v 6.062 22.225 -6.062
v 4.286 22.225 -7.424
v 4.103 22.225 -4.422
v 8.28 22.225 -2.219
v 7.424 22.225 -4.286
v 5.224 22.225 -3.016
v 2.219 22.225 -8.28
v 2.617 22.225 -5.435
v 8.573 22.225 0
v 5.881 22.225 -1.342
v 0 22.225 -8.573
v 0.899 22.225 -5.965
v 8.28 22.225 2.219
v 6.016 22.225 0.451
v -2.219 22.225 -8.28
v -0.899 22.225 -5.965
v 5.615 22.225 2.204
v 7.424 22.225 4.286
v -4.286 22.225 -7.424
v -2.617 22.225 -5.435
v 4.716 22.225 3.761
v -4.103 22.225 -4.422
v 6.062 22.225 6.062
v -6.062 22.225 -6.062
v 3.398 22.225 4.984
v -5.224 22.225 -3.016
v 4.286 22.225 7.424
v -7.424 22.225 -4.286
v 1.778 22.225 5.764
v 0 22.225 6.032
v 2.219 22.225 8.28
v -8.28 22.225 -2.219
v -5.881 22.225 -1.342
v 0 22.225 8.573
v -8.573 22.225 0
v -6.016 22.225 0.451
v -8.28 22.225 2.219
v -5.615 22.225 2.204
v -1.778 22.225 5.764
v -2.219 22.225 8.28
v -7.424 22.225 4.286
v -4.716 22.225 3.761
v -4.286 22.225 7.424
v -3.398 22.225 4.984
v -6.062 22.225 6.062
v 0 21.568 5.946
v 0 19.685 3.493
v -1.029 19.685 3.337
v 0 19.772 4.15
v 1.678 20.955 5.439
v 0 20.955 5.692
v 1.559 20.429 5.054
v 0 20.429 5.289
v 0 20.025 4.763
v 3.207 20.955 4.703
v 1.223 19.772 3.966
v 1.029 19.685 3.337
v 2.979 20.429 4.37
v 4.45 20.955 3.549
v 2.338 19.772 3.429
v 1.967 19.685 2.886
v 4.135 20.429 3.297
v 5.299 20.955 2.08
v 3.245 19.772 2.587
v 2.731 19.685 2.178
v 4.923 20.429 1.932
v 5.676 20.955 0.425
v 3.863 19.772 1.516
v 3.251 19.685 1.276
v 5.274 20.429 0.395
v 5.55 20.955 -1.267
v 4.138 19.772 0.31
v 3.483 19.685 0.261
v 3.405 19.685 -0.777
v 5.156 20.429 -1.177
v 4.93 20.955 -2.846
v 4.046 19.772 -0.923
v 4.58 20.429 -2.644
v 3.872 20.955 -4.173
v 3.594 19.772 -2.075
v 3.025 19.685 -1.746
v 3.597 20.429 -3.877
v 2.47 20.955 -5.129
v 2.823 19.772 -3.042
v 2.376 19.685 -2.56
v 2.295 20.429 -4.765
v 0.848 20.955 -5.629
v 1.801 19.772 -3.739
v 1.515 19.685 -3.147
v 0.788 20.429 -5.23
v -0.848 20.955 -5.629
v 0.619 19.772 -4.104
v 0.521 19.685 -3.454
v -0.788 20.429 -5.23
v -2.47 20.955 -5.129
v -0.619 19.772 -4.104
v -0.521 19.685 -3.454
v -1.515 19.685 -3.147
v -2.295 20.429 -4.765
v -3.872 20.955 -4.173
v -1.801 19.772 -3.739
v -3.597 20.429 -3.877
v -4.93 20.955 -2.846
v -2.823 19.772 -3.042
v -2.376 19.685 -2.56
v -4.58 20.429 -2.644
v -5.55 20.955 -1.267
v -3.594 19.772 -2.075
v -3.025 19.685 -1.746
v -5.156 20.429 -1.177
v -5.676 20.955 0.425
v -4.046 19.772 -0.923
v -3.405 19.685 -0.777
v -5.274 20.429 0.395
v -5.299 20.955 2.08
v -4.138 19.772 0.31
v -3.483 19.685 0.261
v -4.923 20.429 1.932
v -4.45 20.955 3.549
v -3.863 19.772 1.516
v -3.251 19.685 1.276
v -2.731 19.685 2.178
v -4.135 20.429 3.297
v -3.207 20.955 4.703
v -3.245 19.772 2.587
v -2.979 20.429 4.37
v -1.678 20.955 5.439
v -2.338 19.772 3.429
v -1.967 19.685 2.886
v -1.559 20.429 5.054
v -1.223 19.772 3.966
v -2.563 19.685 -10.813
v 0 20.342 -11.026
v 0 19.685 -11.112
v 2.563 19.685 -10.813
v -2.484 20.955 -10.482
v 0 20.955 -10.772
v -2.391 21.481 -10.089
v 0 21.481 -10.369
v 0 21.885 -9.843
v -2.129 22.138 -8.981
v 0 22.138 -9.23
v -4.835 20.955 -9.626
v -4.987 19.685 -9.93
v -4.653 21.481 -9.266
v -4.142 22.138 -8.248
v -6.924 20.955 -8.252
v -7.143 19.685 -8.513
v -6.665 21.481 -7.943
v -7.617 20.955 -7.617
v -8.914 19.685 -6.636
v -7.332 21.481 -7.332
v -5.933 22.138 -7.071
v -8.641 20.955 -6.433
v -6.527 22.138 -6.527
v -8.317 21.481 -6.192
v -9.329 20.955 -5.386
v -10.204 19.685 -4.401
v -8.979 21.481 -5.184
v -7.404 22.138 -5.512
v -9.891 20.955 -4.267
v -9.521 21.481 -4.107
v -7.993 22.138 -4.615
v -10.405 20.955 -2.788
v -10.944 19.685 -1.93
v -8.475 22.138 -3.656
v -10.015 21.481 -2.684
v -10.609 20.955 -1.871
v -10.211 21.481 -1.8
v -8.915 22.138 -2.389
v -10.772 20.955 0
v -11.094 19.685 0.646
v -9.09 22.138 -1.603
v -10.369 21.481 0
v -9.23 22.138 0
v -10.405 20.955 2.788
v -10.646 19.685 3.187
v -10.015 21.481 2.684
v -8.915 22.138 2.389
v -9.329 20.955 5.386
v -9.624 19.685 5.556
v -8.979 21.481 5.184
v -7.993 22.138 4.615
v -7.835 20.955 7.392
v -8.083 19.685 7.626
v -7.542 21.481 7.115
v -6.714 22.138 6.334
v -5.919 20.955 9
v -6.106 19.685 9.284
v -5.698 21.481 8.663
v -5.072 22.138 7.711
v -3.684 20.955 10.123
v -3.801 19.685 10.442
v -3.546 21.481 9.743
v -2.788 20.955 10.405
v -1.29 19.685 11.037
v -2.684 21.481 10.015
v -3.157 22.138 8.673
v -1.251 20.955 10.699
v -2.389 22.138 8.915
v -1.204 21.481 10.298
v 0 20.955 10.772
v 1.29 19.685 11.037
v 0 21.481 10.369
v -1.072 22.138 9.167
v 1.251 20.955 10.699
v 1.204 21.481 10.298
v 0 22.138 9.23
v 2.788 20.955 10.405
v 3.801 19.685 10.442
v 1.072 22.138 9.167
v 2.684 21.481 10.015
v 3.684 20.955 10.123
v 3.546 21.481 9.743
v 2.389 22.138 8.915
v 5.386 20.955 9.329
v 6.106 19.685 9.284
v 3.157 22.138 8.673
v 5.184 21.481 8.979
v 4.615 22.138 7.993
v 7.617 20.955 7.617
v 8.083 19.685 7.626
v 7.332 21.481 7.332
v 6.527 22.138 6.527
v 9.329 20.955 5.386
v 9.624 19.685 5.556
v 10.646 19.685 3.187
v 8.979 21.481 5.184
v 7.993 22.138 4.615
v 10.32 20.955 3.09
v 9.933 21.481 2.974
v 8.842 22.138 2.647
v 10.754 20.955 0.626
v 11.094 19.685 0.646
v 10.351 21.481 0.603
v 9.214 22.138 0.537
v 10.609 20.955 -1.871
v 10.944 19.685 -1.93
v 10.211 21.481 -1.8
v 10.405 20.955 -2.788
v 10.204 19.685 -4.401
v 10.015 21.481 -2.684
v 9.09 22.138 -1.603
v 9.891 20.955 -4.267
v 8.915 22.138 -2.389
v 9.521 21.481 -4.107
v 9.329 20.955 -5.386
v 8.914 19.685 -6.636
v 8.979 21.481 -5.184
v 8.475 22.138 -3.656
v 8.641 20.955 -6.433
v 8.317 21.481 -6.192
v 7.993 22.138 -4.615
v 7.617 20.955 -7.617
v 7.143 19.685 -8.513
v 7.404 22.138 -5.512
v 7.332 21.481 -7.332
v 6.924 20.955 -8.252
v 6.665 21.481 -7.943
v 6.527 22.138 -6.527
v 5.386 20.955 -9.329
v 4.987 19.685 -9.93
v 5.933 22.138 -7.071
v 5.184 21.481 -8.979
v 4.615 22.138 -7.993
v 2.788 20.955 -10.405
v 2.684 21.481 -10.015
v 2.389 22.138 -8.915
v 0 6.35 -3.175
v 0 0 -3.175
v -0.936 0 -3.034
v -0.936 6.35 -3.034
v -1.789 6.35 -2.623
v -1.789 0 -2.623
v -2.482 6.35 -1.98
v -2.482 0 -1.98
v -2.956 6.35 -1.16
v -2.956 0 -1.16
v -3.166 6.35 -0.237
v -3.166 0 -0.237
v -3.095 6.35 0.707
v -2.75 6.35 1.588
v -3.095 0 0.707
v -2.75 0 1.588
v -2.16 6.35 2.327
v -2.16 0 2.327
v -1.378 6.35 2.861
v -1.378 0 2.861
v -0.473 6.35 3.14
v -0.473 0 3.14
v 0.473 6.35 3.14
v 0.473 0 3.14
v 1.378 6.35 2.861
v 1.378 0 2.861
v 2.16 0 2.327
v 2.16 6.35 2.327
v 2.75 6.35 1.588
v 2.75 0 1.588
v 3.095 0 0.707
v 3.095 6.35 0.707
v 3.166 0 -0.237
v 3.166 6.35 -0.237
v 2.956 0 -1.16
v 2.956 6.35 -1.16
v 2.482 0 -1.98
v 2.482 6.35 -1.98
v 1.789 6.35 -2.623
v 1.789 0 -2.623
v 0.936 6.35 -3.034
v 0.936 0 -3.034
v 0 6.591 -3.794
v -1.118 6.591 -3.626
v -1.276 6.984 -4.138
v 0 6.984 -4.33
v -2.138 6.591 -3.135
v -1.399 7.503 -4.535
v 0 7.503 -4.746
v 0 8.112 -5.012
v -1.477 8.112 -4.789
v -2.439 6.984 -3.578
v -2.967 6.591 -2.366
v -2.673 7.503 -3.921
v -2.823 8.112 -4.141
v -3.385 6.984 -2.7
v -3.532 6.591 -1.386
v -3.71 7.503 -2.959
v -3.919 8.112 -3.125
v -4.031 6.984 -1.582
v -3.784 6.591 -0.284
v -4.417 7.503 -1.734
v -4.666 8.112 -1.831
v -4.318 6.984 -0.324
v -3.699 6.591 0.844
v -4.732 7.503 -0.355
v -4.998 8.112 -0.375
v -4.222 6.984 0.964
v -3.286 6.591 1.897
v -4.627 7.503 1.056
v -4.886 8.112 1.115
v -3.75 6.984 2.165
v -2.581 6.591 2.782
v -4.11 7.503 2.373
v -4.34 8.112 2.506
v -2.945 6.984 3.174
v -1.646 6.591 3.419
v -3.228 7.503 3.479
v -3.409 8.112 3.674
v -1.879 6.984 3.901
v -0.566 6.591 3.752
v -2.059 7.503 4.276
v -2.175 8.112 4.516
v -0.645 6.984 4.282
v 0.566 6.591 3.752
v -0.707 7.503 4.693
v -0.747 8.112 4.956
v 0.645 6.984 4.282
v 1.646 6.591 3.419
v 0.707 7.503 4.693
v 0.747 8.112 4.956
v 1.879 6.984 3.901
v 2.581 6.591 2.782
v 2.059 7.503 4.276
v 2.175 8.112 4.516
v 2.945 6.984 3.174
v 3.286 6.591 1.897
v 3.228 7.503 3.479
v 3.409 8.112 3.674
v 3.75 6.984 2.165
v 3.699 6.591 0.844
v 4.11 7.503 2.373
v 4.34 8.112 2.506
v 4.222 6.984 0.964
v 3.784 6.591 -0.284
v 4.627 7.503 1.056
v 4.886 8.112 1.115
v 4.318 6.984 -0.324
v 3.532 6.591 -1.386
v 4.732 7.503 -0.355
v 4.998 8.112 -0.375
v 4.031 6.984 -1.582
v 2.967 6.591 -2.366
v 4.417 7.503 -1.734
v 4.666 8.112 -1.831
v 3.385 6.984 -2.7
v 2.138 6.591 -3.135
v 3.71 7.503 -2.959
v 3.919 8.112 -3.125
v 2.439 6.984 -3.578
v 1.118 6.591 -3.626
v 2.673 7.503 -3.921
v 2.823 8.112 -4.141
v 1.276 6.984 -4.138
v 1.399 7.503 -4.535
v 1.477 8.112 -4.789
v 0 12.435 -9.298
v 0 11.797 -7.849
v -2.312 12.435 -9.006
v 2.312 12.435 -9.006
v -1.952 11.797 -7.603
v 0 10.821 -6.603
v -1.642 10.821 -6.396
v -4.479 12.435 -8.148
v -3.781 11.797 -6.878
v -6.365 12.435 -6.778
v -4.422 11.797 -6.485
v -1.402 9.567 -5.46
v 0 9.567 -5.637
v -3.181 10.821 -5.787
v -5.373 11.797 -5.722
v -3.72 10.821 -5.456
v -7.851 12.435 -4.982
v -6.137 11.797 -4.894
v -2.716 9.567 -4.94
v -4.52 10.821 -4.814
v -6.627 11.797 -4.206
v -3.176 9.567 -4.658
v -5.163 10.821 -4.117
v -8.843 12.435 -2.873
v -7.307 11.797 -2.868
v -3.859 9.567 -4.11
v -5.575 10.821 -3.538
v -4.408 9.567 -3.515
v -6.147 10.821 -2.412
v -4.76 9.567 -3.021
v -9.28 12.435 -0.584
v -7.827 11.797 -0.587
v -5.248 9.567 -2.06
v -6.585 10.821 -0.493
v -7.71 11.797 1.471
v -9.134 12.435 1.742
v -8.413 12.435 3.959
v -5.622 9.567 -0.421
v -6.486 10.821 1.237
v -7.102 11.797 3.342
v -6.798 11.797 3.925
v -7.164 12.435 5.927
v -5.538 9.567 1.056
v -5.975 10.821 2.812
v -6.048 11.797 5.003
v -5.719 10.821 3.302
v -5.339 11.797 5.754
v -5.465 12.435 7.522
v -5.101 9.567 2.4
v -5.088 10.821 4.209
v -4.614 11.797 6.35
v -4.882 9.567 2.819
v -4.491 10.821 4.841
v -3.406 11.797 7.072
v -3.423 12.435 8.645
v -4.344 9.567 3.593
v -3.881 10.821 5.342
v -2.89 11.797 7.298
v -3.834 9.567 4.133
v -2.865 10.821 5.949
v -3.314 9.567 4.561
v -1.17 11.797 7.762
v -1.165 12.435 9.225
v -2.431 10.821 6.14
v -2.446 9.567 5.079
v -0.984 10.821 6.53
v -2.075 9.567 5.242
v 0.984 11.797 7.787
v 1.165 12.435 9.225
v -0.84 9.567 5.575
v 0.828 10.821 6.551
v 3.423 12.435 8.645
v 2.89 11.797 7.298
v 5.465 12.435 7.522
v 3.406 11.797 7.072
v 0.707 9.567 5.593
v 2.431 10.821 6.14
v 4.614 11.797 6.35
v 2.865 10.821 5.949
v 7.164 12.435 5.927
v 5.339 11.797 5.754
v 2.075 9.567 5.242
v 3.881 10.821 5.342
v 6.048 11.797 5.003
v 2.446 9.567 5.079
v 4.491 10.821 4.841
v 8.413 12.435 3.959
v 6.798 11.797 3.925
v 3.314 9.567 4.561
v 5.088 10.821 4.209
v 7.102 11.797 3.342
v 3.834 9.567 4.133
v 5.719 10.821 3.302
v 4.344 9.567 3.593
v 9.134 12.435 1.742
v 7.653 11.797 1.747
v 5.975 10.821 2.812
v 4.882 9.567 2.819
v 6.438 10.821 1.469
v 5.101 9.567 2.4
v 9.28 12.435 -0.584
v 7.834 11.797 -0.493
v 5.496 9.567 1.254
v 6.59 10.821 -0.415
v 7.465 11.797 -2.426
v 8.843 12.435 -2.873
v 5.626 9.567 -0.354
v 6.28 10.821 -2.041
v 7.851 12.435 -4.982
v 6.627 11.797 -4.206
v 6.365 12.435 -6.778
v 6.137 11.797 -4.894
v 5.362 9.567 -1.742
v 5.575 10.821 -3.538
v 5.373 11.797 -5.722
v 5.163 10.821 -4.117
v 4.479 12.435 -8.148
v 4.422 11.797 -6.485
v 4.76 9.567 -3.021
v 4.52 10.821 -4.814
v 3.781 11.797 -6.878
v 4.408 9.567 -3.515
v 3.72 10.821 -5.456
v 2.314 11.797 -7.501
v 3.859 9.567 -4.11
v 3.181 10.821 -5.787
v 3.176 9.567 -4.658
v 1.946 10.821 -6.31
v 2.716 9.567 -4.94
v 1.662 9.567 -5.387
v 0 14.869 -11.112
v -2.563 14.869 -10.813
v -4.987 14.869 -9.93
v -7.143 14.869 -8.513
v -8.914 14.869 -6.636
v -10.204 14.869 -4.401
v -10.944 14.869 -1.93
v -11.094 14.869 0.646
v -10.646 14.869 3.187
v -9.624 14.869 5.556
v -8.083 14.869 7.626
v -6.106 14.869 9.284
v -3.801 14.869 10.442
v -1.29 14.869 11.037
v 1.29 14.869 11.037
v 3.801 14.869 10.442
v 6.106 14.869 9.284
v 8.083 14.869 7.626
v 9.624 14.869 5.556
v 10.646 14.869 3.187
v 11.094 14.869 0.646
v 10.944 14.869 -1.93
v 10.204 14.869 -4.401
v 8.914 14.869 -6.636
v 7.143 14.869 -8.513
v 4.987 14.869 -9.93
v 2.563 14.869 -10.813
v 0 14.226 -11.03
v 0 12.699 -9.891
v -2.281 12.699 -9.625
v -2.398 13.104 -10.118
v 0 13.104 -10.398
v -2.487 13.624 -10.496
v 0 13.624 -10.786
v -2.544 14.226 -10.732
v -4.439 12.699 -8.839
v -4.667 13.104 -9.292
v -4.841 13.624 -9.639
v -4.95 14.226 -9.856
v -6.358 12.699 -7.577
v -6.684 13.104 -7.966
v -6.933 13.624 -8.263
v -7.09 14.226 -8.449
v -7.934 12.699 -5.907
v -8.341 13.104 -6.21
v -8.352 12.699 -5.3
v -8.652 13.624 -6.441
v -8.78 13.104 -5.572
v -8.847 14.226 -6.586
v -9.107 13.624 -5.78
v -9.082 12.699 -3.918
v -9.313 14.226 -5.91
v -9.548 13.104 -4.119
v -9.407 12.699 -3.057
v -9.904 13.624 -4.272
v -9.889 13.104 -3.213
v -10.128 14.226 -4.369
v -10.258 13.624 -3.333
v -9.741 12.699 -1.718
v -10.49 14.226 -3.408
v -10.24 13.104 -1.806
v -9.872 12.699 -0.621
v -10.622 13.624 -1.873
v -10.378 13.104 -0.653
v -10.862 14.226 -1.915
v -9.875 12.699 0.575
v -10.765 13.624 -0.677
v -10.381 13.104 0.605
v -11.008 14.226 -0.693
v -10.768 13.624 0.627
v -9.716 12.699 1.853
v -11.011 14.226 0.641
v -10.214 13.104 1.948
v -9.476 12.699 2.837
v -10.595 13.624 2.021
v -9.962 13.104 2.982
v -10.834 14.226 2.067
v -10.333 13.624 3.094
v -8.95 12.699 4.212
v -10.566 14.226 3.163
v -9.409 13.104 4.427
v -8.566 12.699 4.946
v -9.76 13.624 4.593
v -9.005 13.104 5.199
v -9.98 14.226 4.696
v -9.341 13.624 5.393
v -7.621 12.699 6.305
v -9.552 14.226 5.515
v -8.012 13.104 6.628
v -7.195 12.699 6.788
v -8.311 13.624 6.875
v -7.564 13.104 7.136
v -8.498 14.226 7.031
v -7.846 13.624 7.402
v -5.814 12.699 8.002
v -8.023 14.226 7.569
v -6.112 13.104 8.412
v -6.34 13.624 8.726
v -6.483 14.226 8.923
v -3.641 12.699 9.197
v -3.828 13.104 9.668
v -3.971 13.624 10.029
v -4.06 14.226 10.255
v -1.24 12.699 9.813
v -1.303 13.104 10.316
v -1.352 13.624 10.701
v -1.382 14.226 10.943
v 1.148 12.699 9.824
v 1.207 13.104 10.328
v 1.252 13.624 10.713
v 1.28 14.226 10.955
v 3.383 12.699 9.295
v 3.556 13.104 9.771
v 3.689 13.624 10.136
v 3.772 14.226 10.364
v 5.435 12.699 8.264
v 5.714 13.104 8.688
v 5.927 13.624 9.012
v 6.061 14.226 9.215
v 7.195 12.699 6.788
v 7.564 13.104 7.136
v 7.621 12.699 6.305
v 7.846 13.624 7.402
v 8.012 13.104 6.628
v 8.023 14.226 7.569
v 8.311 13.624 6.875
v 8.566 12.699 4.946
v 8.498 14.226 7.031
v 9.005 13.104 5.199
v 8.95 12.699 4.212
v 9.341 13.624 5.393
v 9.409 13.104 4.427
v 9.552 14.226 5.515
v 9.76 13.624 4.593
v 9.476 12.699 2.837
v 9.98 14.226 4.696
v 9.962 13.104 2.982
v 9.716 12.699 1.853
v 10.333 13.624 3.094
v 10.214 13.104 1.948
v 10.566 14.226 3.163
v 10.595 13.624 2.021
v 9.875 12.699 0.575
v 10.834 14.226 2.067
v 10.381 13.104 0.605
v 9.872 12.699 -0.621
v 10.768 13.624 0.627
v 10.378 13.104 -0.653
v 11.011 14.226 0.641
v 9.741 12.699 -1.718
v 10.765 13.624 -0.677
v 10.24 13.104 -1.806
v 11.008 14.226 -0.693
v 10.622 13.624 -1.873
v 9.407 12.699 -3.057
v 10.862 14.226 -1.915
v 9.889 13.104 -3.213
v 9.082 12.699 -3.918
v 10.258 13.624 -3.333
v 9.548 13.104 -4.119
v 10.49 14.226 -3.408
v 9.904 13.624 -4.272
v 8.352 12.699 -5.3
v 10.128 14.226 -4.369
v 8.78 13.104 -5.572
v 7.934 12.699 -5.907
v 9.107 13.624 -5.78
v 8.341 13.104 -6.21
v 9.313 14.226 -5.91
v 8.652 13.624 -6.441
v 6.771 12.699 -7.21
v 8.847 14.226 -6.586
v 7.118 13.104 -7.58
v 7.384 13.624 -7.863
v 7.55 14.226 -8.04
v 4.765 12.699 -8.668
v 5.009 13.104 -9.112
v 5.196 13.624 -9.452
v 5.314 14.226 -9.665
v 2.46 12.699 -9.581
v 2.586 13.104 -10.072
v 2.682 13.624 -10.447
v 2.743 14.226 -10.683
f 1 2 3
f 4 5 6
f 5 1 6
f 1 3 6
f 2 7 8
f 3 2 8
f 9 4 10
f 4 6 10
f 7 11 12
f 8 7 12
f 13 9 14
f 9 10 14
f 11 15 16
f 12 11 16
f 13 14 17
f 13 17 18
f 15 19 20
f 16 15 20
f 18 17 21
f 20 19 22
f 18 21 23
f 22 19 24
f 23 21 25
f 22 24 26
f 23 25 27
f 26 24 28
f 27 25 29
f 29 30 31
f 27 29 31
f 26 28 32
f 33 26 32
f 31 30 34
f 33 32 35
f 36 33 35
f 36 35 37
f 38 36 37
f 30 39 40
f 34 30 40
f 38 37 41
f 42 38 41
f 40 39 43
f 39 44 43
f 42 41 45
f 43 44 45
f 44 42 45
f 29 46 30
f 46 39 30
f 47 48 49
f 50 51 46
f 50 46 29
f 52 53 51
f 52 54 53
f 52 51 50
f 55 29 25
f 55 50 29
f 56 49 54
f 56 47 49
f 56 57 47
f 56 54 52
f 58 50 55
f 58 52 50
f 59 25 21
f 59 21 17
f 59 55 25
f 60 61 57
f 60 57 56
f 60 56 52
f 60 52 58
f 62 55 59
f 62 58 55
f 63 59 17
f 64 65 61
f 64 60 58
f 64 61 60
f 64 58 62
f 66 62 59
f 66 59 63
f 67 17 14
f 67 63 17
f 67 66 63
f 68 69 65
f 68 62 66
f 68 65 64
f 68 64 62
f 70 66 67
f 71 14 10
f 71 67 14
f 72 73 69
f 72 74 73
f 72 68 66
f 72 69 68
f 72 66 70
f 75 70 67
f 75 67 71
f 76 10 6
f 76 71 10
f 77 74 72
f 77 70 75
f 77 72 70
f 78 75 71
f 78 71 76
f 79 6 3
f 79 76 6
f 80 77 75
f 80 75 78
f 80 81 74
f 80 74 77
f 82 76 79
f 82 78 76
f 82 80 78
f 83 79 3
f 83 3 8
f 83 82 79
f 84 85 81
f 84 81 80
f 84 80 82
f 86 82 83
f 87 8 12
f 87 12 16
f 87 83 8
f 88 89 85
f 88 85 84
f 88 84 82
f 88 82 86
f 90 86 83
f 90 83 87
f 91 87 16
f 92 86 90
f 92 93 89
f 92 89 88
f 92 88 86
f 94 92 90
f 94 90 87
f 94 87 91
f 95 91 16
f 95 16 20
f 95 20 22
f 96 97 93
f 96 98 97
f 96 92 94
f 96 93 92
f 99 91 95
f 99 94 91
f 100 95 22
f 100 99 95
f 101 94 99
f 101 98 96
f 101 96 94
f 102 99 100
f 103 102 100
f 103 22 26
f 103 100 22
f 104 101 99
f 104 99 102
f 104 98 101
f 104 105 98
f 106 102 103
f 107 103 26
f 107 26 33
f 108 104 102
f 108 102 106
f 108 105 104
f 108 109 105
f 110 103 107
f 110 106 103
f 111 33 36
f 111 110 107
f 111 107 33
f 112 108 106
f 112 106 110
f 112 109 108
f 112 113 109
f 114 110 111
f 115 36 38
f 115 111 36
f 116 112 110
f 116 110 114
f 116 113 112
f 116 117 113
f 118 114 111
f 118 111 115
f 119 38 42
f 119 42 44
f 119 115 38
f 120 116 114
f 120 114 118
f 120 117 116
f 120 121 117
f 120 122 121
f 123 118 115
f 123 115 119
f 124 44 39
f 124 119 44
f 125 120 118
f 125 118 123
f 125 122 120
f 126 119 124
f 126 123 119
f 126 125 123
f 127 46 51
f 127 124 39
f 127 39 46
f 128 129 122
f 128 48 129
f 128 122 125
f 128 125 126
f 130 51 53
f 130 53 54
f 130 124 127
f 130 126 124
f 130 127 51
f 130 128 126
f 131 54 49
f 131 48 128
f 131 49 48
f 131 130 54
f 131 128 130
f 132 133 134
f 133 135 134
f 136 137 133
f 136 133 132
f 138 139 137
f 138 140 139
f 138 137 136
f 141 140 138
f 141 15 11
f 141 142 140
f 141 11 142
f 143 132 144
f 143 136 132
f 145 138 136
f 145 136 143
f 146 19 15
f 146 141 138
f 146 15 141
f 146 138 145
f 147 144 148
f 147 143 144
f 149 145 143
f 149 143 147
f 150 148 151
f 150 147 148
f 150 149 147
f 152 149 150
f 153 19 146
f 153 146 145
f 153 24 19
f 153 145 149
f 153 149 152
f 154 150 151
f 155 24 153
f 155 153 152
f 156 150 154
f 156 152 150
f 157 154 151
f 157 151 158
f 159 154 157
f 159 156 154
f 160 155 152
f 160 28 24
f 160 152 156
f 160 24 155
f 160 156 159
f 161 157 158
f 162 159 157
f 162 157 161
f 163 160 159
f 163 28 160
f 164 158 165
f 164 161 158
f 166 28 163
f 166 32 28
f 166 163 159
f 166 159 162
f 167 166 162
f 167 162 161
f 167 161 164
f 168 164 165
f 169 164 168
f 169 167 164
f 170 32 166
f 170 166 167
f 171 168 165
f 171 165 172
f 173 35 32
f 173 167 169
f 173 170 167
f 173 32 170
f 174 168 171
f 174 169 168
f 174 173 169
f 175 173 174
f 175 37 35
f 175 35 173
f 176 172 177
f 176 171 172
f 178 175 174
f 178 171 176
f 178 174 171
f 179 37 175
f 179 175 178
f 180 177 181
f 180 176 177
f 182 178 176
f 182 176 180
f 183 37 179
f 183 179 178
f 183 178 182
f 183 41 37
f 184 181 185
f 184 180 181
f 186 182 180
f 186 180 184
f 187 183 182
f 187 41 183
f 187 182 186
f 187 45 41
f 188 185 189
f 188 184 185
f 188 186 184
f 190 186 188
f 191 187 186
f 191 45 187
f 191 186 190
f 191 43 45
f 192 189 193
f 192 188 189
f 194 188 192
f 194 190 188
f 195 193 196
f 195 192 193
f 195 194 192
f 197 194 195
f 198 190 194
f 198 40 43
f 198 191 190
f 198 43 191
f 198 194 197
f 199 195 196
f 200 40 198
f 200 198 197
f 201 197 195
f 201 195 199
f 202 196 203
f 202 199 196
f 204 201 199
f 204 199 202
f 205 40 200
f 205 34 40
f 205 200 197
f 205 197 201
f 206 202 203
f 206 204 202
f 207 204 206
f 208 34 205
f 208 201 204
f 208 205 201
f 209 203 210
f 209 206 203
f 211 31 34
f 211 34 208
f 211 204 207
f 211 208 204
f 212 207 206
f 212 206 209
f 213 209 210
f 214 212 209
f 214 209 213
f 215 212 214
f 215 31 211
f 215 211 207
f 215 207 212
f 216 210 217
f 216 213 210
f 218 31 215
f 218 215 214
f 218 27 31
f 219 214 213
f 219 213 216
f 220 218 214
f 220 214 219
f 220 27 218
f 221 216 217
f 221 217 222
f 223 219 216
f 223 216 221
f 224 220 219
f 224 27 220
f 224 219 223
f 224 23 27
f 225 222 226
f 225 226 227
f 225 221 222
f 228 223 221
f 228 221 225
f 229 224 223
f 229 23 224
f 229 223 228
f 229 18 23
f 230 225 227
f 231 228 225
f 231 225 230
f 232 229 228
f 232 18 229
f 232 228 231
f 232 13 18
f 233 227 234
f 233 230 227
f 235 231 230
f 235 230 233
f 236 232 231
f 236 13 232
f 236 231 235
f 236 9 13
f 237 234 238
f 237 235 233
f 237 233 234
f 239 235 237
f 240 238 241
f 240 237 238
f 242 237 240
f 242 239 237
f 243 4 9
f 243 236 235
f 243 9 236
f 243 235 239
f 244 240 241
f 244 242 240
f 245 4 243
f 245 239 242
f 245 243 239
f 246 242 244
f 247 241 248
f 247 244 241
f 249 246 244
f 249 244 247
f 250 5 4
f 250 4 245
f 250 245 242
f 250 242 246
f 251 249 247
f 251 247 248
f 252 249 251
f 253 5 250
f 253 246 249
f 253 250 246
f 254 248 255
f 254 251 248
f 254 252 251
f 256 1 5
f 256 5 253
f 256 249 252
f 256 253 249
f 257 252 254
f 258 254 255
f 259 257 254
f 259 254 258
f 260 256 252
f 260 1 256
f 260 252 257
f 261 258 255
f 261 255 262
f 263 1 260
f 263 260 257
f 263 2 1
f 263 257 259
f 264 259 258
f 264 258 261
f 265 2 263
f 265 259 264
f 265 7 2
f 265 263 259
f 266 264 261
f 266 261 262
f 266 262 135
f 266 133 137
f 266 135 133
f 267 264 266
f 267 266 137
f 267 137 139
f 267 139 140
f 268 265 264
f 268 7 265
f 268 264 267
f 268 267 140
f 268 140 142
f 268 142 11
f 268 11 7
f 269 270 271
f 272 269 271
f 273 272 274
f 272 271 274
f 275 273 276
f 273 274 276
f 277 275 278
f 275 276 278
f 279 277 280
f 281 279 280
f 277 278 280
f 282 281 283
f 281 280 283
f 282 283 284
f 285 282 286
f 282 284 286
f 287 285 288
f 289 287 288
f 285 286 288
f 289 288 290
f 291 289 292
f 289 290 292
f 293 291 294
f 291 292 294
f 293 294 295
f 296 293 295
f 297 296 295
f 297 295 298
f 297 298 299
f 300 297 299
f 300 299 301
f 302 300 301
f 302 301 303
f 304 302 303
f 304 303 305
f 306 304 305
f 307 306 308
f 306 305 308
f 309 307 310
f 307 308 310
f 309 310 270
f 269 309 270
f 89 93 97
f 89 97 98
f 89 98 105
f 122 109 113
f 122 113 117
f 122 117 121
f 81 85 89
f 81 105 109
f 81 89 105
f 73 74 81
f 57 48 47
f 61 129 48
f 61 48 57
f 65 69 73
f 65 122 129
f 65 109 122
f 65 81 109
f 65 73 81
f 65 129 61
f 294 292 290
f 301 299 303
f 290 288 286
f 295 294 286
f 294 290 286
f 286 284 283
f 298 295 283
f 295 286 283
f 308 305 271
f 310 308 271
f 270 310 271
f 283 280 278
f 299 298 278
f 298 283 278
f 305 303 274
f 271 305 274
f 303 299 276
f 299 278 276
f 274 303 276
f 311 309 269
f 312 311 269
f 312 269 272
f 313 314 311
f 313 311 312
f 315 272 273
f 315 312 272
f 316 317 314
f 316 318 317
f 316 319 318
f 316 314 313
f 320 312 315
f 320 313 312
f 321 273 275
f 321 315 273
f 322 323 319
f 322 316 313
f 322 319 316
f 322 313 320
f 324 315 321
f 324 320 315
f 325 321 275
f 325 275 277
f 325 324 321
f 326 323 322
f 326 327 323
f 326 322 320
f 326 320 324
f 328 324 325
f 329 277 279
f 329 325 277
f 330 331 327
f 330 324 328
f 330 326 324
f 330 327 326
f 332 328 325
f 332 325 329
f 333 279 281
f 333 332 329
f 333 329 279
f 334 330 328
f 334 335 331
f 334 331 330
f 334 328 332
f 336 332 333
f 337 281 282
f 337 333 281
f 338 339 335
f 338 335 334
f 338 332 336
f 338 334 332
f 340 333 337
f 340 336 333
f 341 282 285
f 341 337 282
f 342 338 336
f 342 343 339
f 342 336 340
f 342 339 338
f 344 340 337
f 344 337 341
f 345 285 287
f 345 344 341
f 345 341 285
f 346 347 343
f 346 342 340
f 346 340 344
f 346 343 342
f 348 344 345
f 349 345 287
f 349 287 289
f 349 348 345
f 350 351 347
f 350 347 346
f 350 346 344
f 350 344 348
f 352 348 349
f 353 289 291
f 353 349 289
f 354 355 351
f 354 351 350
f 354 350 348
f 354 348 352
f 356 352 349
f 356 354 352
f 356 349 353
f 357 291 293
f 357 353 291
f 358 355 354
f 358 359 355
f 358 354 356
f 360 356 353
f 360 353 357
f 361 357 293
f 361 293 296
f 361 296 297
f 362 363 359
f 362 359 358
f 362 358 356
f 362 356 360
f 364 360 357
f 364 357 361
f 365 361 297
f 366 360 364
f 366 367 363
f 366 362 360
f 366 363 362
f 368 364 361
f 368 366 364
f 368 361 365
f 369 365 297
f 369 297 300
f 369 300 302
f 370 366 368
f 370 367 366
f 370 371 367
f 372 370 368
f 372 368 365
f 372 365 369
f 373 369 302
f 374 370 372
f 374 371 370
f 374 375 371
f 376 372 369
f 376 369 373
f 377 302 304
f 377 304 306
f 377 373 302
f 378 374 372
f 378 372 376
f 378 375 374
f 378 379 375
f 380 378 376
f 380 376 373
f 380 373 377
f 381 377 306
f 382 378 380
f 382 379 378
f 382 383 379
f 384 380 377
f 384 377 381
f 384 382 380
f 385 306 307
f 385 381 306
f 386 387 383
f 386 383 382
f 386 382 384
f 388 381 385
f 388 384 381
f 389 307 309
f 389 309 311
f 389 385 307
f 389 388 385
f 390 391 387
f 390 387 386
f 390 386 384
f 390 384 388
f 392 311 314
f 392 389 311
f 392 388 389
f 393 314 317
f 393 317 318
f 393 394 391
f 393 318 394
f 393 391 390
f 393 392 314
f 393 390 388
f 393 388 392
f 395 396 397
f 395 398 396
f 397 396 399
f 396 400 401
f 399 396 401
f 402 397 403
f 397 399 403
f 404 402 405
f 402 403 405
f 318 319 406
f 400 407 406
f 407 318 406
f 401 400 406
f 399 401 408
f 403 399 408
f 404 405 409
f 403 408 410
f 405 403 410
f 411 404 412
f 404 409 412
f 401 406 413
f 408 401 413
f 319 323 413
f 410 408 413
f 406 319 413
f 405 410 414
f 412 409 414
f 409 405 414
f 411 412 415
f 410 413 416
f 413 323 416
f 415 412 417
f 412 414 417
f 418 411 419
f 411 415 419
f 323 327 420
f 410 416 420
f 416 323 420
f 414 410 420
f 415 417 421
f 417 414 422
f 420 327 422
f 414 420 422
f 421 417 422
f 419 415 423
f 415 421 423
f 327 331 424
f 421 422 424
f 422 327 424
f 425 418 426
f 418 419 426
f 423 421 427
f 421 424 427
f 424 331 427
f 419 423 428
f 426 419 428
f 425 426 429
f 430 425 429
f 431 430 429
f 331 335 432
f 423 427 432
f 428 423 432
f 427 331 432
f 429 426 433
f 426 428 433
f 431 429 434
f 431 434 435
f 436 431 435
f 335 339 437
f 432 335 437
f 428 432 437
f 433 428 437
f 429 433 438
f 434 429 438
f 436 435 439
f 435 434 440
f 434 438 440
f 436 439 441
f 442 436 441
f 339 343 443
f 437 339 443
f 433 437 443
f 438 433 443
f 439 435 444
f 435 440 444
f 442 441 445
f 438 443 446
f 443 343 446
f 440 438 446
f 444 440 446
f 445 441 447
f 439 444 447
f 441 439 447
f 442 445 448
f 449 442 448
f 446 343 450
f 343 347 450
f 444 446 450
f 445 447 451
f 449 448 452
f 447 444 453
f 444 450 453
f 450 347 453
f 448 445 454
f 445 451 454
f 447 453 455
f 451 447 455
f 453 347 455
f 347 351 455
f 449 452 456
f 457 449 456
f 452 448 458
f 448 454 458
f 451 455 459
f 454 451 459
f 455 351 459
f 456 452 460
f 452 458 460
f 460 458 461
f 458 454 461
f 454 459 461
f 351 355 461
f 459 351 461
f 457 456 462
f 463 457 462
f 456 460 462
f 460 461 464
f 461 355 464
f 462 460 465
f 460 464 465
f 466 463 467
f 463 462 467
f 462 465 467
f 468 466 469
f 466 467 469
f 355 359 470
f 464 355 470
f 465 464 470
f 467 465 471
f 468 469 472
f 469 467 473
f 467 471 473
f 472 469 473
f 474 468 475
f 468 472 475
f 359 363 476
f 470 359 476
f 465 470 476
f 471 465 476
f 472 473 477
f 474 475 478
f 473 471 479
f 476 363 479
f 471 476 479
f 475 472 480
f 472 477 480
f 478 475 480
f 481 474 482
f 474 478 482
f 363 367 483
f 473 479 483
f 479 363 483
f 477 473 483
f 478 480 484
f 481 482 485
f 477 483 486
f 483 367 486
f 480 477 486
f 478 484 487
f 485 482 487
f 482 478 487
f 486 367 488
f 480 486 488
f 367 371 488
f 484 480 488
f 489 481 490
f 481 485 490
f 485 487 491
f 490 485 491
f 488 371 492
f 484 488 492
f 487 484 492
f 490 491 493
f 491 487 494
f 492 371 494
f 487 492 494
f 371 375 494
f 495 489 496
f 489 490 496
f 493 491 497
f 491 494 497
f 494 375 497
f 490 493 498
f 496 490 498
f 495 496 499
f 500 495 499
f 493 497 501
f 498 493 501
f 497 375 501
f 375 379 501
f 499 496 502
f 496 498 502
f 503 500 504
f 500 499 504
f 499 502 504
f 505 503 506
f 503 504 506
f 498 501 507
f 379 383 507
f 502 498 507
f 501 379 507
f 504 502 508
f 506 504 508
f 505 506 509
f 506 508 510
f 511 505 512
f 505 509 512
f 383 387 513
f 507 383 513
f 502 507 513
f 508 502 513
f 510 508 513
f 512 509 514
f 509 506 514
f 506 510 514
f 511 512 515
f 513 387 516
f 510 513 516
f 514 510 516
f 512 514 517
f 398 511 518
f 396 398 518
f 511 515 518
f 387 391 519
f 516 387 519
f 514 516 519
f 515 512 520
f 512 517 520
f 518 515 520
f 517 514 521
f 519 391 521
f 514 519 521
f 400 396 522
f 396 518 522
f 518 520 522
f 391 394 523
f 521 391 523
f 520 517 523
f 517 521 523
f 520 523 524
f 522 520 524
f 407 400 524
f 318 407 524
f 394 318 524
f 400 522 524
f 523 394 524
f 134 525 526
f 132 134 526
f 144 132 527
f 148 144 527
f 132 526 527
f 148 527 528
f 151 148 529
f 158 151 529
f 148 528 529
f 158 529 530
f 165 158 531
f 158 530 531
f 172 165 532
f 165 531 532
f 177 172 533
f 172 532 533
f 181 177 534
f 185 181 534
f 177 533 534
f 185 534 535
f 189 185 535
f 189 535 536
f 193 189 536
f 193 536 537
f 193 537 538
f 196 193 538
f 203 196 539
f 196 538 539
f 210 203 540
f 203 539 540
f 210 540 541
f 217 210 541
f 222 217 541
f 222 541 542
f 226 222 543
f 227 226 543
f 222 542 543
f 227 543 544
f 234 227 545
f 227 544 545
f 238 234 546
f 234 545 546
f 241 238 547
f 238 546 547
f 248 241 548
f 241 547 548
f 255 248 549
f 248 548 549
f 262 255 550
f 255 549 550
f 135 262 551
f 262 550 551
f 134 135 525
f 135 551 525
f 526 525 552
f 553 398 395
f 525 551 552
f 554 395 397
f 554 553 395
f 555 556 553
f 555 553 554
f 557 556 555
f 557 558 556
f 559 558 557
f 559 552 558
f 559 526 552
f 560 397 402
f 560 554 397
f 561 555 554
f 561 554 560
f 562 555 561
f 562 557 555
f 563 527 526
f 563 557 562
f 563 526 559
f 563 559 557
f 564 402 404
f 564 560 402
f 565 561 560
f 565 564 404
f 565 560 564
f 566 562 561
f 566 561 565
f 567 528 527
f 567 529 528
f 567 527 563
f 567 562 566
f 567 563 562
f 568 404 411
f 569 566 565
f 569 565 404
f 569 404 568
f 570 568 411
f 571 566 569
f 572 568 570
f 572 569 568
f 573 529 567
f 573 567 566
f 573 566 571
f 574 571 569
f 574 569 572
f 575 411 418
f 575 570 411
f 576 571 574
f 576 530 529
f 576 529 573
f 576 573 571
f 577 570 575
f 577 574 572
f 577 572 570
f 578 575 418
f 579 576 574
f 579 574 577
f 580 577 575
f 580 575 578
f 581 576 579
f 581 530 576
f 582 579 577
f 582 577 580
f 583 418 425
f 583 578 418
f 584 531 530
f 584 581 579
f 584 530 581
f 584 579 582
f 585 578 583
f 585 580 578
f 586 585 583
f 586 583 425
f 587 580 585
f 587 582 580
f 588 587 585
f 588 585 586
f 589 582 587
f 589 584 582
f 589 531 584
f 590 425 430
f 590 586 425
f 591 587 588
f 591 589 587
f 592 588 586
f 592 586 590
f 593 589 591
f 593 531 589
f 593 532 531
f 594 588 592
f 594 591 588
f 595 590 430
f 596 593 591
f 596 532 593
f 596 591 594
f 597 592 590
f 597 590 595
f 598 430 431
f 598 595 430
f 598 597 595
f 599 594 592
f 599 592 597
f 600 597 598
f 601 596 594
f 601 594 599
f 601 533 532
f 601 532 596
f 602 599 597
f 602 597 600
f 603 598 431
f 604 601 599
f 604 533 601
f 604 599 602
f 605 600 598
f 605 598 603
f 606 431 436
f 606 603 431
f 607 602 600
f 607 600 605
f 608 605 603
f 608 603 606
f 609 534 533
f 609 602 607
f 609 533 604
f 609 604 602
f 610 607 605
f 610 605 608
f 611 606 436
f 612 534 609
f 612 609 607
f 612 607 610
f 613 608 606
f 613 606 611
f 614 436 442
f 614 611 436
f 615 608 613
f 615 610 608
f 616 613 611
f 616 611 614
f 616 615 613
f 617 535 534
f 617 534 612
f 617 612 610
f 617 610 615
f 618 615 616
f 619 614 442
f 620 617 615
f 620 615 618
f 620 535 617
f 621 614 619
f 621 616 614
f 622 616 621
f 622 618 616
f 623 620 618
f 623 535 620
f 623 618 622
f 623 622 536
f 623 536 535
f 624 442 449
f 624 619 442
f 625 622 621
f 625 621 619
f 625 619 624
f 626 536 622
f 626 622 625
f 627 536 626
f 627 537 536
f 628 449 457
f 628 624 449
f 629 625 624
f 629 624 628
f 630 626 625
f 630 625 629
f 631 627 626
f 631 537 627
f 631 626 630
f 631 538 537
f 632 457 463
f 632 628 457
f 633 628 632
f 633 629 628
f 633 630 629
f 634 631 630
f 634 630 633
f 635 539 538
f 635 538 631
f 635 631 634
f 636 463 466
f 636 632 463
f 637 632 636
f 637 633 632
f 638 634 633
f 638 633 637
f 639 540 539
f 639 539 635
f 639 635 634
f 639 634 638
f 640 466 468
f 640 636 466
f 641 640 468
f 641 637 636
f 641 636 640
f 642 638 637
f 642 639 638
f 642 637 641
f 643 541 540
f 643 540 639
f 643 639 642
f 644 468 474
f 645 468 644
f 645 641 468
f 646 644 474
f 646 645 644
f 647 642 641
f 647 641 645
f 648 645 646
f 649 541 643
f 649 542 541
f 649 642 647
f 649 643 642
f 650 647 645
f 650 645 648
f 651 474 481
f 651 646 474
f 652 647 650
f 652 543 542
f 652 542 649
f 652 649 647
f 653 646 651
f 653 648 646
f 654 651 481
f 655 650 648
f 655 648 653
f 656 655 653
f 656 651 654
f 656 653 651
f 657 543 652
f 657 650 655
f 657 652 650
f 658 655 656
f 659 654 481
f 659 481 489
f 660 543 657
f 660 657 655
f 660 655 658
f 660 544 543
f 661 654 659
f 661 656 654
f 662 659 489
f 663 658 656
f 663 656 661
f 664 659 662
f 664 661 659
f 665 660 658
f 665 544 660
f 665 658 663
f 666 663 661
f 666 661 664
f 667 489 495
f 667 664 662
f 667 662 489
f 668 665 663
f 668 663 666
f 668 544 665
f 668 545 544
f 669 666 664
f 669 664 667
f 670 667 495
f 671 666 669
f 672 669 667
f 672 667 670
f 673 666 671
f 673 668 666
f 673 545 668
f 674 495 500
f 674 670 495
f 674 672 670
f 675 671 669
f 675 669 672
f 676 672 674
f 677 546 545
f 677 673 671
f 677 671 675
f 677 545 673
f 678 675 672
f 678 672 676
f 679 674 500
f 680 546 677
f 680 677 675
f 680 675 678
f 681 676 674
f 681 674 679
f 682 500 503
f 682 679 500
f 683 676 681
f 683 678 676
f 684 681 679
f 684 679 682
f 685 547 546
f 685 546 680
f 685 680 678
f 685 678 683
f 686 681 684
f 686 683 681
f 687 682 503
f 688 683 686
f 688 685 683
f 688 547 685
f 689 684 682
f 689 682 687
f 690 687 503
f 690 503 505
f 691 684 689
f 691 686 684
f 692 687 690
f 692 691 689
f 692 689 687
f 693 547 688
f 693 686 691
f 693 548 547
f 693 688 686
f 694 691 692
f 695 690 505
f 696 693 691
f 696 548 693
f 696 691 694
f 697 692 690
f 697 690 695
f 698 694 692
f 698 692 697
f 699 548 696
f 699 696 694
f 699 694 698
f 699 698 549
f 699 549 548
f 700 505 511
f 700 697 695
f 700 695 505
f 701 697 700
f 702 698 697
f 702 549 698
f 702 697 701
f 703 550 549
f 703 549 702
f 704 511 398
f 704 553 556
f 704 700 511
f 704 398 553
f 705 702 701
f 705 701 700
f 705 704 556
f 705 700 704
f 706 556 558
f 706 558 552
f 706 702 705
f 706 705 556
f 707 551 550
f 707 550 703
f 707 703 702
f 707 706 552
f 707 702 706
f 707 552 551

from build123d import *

# Parameters (mm, degrees)
FILLET1_R          = 2.54
SKETCH2_R          = 6.0325
CUT_EXTRUDE1_DEPTH = 2.54
FILLET2_R          = 2.54


# Some blends are built 0.0001 mm under size
with BuildPart() as part:
    # Sketch1 → Base-Revolve (revolve)
    with BuildSketch(Plane.XY, mode=Mode.PRIVATE) as base_revolve_sk:
        with BuildLine():
            ThreePointArc((11.1125, 12.7), (6.622371939, 10.840128061), (4.7625, 6.35))
            Line((4.7625, 6.35), (3.175, 6.35))
            Line((3.175, 6.35), (3.175, 0))
            Line((3.175, 0), (0, 0))
            Line((0, 0), (0, 22.225))
            Line((0, 22.225), (11.1125, 22.225))
            Line((11.1125, 22.225), (11.1125, 12.7))
        make_face()
    revolve(base_revolve_sk.sketch.rotate(Axis((0, 0, 0), (0, 1, 0)), 90), axis=Axis((0, 0, 0), (0, 1, 0)))

    # Fillet1
    # the kernel refuses this fillet: 2.54 mm, written as the material it takes off along each edge
    with BuildSketch(Plane(origin=(0, 6.35, 0), x_dir=(0, 0, -1), z_dir=(1, 0, 0))) as fillet1_piece_1:
        with BuildLine():
            CenterArc((2.57175, 2.467324348), FILLET1_R, 283.739035174, 60.14756783)
            Line((3.175, 0), (3.187065, -0.049346487))
            ThreePointArc((3.187065, -0.049346487), (3.96875, -0.0508), (4.7625, -0.0508))
            Line((4.7625, -0.0508), (4.8133, 0))
            ThreePointArc((4.8133, 0), (4.875473976, 0.882851637), (5.060768571, 1.748275538))
            Line((5.060768571, 1.748275538), (5.011964286, 1.762374534))
        make_face()
    revolve(axis=Axis((0, 6.35, 0), (0, 1, 0)), mode=Mode.SUBTRACT)
    with BuildSketch(Plane(origin=(0, 22.225, 0), x_dir=(0, 0, -1), z_dir=(1, 0, 0))) as fillet1_piece_2:
        with BuildLine():
            CenterArc((11.1125 - FILLET1_R, -FILLET1_R), FILLET1_R, 0, 90)
            Line((11.1125, -FILLET1_R), (11.1125 + FILLET1_R * 0.02, -FILLET1_R))
            Line((11.1125 + FILLET1_R * 0.02, -FILLET1_R), (11.1125 + FILLET1_R * 0.02, FILLET1_R * 0.02))
            Line((11.1125 + FILLET1_R * 0.02, FILLET1_R * 0.02), (11.1125 - FILLET1_R, FILLET1_R * 0.02))
            Line((11.1125 - FILLET1_R, FILLET1_R * 0.02), (11.1125 - FILLET1_R, 0))
        make_face()
    revolve(axis=Axis((0, 22.225, 0), (0, 1, 0)), mode=Mode.SUBTRACT)
    with BuildSketch(Plane(origin=(0, 12.7, 0), x_dir=(0, 0, -1), z_dir=(1, 0, 0))) as fillet1_piece_3:
        with BuildLine():
            CenterArc((8.5725, 2.169418994), FILLET1_R, 286.601549599, 73.398450401)
            Line((11.1125, 2.169418994), (11.1633, 2.169418994))
            Line((11.1633, 2.169418994), (11.1633, 0))
            Line((11.1633, 0), (11.1125, -0.0508))
            ThreePointArc((11.1125, -0.0508), (10.203087128, -0.116791447), (9.312728571, -0.313383113))
            Line((9.312728571, -0.313383113), (9.298214286, -0.264700718))
        make_face()
    revolve(axis=Axis((0, 12.7, 0), (0, 1, 0)), mode=Mode.SUBTRACT)

    # Sketch2 → Cut-Extrude1 (cut)
    with BuildSketch(Plane(origin=(0, 22.225, 0), x_dir=(1, 0, 0), z_dir=(0, 1, 0))):
        with Locations(Location((0, 0, 0), (0, 0, 270))):
            Circle(SKETCH2_R)
    extrude(amount=-CUT_EXTRUDE1_DEPTH, mode=Mode.SUBTRACT)

    # Fillet2
    fillet2_edges = [part.edges().sort_by_distance(p)[0] for p in [
        (0, 19.685, -6.0325),
    ]]
    fillet(fillet2_edges, radius=FILLET2_R - 0.0001)  # a hair under: the kernel refuses the full size


solid = part.part
